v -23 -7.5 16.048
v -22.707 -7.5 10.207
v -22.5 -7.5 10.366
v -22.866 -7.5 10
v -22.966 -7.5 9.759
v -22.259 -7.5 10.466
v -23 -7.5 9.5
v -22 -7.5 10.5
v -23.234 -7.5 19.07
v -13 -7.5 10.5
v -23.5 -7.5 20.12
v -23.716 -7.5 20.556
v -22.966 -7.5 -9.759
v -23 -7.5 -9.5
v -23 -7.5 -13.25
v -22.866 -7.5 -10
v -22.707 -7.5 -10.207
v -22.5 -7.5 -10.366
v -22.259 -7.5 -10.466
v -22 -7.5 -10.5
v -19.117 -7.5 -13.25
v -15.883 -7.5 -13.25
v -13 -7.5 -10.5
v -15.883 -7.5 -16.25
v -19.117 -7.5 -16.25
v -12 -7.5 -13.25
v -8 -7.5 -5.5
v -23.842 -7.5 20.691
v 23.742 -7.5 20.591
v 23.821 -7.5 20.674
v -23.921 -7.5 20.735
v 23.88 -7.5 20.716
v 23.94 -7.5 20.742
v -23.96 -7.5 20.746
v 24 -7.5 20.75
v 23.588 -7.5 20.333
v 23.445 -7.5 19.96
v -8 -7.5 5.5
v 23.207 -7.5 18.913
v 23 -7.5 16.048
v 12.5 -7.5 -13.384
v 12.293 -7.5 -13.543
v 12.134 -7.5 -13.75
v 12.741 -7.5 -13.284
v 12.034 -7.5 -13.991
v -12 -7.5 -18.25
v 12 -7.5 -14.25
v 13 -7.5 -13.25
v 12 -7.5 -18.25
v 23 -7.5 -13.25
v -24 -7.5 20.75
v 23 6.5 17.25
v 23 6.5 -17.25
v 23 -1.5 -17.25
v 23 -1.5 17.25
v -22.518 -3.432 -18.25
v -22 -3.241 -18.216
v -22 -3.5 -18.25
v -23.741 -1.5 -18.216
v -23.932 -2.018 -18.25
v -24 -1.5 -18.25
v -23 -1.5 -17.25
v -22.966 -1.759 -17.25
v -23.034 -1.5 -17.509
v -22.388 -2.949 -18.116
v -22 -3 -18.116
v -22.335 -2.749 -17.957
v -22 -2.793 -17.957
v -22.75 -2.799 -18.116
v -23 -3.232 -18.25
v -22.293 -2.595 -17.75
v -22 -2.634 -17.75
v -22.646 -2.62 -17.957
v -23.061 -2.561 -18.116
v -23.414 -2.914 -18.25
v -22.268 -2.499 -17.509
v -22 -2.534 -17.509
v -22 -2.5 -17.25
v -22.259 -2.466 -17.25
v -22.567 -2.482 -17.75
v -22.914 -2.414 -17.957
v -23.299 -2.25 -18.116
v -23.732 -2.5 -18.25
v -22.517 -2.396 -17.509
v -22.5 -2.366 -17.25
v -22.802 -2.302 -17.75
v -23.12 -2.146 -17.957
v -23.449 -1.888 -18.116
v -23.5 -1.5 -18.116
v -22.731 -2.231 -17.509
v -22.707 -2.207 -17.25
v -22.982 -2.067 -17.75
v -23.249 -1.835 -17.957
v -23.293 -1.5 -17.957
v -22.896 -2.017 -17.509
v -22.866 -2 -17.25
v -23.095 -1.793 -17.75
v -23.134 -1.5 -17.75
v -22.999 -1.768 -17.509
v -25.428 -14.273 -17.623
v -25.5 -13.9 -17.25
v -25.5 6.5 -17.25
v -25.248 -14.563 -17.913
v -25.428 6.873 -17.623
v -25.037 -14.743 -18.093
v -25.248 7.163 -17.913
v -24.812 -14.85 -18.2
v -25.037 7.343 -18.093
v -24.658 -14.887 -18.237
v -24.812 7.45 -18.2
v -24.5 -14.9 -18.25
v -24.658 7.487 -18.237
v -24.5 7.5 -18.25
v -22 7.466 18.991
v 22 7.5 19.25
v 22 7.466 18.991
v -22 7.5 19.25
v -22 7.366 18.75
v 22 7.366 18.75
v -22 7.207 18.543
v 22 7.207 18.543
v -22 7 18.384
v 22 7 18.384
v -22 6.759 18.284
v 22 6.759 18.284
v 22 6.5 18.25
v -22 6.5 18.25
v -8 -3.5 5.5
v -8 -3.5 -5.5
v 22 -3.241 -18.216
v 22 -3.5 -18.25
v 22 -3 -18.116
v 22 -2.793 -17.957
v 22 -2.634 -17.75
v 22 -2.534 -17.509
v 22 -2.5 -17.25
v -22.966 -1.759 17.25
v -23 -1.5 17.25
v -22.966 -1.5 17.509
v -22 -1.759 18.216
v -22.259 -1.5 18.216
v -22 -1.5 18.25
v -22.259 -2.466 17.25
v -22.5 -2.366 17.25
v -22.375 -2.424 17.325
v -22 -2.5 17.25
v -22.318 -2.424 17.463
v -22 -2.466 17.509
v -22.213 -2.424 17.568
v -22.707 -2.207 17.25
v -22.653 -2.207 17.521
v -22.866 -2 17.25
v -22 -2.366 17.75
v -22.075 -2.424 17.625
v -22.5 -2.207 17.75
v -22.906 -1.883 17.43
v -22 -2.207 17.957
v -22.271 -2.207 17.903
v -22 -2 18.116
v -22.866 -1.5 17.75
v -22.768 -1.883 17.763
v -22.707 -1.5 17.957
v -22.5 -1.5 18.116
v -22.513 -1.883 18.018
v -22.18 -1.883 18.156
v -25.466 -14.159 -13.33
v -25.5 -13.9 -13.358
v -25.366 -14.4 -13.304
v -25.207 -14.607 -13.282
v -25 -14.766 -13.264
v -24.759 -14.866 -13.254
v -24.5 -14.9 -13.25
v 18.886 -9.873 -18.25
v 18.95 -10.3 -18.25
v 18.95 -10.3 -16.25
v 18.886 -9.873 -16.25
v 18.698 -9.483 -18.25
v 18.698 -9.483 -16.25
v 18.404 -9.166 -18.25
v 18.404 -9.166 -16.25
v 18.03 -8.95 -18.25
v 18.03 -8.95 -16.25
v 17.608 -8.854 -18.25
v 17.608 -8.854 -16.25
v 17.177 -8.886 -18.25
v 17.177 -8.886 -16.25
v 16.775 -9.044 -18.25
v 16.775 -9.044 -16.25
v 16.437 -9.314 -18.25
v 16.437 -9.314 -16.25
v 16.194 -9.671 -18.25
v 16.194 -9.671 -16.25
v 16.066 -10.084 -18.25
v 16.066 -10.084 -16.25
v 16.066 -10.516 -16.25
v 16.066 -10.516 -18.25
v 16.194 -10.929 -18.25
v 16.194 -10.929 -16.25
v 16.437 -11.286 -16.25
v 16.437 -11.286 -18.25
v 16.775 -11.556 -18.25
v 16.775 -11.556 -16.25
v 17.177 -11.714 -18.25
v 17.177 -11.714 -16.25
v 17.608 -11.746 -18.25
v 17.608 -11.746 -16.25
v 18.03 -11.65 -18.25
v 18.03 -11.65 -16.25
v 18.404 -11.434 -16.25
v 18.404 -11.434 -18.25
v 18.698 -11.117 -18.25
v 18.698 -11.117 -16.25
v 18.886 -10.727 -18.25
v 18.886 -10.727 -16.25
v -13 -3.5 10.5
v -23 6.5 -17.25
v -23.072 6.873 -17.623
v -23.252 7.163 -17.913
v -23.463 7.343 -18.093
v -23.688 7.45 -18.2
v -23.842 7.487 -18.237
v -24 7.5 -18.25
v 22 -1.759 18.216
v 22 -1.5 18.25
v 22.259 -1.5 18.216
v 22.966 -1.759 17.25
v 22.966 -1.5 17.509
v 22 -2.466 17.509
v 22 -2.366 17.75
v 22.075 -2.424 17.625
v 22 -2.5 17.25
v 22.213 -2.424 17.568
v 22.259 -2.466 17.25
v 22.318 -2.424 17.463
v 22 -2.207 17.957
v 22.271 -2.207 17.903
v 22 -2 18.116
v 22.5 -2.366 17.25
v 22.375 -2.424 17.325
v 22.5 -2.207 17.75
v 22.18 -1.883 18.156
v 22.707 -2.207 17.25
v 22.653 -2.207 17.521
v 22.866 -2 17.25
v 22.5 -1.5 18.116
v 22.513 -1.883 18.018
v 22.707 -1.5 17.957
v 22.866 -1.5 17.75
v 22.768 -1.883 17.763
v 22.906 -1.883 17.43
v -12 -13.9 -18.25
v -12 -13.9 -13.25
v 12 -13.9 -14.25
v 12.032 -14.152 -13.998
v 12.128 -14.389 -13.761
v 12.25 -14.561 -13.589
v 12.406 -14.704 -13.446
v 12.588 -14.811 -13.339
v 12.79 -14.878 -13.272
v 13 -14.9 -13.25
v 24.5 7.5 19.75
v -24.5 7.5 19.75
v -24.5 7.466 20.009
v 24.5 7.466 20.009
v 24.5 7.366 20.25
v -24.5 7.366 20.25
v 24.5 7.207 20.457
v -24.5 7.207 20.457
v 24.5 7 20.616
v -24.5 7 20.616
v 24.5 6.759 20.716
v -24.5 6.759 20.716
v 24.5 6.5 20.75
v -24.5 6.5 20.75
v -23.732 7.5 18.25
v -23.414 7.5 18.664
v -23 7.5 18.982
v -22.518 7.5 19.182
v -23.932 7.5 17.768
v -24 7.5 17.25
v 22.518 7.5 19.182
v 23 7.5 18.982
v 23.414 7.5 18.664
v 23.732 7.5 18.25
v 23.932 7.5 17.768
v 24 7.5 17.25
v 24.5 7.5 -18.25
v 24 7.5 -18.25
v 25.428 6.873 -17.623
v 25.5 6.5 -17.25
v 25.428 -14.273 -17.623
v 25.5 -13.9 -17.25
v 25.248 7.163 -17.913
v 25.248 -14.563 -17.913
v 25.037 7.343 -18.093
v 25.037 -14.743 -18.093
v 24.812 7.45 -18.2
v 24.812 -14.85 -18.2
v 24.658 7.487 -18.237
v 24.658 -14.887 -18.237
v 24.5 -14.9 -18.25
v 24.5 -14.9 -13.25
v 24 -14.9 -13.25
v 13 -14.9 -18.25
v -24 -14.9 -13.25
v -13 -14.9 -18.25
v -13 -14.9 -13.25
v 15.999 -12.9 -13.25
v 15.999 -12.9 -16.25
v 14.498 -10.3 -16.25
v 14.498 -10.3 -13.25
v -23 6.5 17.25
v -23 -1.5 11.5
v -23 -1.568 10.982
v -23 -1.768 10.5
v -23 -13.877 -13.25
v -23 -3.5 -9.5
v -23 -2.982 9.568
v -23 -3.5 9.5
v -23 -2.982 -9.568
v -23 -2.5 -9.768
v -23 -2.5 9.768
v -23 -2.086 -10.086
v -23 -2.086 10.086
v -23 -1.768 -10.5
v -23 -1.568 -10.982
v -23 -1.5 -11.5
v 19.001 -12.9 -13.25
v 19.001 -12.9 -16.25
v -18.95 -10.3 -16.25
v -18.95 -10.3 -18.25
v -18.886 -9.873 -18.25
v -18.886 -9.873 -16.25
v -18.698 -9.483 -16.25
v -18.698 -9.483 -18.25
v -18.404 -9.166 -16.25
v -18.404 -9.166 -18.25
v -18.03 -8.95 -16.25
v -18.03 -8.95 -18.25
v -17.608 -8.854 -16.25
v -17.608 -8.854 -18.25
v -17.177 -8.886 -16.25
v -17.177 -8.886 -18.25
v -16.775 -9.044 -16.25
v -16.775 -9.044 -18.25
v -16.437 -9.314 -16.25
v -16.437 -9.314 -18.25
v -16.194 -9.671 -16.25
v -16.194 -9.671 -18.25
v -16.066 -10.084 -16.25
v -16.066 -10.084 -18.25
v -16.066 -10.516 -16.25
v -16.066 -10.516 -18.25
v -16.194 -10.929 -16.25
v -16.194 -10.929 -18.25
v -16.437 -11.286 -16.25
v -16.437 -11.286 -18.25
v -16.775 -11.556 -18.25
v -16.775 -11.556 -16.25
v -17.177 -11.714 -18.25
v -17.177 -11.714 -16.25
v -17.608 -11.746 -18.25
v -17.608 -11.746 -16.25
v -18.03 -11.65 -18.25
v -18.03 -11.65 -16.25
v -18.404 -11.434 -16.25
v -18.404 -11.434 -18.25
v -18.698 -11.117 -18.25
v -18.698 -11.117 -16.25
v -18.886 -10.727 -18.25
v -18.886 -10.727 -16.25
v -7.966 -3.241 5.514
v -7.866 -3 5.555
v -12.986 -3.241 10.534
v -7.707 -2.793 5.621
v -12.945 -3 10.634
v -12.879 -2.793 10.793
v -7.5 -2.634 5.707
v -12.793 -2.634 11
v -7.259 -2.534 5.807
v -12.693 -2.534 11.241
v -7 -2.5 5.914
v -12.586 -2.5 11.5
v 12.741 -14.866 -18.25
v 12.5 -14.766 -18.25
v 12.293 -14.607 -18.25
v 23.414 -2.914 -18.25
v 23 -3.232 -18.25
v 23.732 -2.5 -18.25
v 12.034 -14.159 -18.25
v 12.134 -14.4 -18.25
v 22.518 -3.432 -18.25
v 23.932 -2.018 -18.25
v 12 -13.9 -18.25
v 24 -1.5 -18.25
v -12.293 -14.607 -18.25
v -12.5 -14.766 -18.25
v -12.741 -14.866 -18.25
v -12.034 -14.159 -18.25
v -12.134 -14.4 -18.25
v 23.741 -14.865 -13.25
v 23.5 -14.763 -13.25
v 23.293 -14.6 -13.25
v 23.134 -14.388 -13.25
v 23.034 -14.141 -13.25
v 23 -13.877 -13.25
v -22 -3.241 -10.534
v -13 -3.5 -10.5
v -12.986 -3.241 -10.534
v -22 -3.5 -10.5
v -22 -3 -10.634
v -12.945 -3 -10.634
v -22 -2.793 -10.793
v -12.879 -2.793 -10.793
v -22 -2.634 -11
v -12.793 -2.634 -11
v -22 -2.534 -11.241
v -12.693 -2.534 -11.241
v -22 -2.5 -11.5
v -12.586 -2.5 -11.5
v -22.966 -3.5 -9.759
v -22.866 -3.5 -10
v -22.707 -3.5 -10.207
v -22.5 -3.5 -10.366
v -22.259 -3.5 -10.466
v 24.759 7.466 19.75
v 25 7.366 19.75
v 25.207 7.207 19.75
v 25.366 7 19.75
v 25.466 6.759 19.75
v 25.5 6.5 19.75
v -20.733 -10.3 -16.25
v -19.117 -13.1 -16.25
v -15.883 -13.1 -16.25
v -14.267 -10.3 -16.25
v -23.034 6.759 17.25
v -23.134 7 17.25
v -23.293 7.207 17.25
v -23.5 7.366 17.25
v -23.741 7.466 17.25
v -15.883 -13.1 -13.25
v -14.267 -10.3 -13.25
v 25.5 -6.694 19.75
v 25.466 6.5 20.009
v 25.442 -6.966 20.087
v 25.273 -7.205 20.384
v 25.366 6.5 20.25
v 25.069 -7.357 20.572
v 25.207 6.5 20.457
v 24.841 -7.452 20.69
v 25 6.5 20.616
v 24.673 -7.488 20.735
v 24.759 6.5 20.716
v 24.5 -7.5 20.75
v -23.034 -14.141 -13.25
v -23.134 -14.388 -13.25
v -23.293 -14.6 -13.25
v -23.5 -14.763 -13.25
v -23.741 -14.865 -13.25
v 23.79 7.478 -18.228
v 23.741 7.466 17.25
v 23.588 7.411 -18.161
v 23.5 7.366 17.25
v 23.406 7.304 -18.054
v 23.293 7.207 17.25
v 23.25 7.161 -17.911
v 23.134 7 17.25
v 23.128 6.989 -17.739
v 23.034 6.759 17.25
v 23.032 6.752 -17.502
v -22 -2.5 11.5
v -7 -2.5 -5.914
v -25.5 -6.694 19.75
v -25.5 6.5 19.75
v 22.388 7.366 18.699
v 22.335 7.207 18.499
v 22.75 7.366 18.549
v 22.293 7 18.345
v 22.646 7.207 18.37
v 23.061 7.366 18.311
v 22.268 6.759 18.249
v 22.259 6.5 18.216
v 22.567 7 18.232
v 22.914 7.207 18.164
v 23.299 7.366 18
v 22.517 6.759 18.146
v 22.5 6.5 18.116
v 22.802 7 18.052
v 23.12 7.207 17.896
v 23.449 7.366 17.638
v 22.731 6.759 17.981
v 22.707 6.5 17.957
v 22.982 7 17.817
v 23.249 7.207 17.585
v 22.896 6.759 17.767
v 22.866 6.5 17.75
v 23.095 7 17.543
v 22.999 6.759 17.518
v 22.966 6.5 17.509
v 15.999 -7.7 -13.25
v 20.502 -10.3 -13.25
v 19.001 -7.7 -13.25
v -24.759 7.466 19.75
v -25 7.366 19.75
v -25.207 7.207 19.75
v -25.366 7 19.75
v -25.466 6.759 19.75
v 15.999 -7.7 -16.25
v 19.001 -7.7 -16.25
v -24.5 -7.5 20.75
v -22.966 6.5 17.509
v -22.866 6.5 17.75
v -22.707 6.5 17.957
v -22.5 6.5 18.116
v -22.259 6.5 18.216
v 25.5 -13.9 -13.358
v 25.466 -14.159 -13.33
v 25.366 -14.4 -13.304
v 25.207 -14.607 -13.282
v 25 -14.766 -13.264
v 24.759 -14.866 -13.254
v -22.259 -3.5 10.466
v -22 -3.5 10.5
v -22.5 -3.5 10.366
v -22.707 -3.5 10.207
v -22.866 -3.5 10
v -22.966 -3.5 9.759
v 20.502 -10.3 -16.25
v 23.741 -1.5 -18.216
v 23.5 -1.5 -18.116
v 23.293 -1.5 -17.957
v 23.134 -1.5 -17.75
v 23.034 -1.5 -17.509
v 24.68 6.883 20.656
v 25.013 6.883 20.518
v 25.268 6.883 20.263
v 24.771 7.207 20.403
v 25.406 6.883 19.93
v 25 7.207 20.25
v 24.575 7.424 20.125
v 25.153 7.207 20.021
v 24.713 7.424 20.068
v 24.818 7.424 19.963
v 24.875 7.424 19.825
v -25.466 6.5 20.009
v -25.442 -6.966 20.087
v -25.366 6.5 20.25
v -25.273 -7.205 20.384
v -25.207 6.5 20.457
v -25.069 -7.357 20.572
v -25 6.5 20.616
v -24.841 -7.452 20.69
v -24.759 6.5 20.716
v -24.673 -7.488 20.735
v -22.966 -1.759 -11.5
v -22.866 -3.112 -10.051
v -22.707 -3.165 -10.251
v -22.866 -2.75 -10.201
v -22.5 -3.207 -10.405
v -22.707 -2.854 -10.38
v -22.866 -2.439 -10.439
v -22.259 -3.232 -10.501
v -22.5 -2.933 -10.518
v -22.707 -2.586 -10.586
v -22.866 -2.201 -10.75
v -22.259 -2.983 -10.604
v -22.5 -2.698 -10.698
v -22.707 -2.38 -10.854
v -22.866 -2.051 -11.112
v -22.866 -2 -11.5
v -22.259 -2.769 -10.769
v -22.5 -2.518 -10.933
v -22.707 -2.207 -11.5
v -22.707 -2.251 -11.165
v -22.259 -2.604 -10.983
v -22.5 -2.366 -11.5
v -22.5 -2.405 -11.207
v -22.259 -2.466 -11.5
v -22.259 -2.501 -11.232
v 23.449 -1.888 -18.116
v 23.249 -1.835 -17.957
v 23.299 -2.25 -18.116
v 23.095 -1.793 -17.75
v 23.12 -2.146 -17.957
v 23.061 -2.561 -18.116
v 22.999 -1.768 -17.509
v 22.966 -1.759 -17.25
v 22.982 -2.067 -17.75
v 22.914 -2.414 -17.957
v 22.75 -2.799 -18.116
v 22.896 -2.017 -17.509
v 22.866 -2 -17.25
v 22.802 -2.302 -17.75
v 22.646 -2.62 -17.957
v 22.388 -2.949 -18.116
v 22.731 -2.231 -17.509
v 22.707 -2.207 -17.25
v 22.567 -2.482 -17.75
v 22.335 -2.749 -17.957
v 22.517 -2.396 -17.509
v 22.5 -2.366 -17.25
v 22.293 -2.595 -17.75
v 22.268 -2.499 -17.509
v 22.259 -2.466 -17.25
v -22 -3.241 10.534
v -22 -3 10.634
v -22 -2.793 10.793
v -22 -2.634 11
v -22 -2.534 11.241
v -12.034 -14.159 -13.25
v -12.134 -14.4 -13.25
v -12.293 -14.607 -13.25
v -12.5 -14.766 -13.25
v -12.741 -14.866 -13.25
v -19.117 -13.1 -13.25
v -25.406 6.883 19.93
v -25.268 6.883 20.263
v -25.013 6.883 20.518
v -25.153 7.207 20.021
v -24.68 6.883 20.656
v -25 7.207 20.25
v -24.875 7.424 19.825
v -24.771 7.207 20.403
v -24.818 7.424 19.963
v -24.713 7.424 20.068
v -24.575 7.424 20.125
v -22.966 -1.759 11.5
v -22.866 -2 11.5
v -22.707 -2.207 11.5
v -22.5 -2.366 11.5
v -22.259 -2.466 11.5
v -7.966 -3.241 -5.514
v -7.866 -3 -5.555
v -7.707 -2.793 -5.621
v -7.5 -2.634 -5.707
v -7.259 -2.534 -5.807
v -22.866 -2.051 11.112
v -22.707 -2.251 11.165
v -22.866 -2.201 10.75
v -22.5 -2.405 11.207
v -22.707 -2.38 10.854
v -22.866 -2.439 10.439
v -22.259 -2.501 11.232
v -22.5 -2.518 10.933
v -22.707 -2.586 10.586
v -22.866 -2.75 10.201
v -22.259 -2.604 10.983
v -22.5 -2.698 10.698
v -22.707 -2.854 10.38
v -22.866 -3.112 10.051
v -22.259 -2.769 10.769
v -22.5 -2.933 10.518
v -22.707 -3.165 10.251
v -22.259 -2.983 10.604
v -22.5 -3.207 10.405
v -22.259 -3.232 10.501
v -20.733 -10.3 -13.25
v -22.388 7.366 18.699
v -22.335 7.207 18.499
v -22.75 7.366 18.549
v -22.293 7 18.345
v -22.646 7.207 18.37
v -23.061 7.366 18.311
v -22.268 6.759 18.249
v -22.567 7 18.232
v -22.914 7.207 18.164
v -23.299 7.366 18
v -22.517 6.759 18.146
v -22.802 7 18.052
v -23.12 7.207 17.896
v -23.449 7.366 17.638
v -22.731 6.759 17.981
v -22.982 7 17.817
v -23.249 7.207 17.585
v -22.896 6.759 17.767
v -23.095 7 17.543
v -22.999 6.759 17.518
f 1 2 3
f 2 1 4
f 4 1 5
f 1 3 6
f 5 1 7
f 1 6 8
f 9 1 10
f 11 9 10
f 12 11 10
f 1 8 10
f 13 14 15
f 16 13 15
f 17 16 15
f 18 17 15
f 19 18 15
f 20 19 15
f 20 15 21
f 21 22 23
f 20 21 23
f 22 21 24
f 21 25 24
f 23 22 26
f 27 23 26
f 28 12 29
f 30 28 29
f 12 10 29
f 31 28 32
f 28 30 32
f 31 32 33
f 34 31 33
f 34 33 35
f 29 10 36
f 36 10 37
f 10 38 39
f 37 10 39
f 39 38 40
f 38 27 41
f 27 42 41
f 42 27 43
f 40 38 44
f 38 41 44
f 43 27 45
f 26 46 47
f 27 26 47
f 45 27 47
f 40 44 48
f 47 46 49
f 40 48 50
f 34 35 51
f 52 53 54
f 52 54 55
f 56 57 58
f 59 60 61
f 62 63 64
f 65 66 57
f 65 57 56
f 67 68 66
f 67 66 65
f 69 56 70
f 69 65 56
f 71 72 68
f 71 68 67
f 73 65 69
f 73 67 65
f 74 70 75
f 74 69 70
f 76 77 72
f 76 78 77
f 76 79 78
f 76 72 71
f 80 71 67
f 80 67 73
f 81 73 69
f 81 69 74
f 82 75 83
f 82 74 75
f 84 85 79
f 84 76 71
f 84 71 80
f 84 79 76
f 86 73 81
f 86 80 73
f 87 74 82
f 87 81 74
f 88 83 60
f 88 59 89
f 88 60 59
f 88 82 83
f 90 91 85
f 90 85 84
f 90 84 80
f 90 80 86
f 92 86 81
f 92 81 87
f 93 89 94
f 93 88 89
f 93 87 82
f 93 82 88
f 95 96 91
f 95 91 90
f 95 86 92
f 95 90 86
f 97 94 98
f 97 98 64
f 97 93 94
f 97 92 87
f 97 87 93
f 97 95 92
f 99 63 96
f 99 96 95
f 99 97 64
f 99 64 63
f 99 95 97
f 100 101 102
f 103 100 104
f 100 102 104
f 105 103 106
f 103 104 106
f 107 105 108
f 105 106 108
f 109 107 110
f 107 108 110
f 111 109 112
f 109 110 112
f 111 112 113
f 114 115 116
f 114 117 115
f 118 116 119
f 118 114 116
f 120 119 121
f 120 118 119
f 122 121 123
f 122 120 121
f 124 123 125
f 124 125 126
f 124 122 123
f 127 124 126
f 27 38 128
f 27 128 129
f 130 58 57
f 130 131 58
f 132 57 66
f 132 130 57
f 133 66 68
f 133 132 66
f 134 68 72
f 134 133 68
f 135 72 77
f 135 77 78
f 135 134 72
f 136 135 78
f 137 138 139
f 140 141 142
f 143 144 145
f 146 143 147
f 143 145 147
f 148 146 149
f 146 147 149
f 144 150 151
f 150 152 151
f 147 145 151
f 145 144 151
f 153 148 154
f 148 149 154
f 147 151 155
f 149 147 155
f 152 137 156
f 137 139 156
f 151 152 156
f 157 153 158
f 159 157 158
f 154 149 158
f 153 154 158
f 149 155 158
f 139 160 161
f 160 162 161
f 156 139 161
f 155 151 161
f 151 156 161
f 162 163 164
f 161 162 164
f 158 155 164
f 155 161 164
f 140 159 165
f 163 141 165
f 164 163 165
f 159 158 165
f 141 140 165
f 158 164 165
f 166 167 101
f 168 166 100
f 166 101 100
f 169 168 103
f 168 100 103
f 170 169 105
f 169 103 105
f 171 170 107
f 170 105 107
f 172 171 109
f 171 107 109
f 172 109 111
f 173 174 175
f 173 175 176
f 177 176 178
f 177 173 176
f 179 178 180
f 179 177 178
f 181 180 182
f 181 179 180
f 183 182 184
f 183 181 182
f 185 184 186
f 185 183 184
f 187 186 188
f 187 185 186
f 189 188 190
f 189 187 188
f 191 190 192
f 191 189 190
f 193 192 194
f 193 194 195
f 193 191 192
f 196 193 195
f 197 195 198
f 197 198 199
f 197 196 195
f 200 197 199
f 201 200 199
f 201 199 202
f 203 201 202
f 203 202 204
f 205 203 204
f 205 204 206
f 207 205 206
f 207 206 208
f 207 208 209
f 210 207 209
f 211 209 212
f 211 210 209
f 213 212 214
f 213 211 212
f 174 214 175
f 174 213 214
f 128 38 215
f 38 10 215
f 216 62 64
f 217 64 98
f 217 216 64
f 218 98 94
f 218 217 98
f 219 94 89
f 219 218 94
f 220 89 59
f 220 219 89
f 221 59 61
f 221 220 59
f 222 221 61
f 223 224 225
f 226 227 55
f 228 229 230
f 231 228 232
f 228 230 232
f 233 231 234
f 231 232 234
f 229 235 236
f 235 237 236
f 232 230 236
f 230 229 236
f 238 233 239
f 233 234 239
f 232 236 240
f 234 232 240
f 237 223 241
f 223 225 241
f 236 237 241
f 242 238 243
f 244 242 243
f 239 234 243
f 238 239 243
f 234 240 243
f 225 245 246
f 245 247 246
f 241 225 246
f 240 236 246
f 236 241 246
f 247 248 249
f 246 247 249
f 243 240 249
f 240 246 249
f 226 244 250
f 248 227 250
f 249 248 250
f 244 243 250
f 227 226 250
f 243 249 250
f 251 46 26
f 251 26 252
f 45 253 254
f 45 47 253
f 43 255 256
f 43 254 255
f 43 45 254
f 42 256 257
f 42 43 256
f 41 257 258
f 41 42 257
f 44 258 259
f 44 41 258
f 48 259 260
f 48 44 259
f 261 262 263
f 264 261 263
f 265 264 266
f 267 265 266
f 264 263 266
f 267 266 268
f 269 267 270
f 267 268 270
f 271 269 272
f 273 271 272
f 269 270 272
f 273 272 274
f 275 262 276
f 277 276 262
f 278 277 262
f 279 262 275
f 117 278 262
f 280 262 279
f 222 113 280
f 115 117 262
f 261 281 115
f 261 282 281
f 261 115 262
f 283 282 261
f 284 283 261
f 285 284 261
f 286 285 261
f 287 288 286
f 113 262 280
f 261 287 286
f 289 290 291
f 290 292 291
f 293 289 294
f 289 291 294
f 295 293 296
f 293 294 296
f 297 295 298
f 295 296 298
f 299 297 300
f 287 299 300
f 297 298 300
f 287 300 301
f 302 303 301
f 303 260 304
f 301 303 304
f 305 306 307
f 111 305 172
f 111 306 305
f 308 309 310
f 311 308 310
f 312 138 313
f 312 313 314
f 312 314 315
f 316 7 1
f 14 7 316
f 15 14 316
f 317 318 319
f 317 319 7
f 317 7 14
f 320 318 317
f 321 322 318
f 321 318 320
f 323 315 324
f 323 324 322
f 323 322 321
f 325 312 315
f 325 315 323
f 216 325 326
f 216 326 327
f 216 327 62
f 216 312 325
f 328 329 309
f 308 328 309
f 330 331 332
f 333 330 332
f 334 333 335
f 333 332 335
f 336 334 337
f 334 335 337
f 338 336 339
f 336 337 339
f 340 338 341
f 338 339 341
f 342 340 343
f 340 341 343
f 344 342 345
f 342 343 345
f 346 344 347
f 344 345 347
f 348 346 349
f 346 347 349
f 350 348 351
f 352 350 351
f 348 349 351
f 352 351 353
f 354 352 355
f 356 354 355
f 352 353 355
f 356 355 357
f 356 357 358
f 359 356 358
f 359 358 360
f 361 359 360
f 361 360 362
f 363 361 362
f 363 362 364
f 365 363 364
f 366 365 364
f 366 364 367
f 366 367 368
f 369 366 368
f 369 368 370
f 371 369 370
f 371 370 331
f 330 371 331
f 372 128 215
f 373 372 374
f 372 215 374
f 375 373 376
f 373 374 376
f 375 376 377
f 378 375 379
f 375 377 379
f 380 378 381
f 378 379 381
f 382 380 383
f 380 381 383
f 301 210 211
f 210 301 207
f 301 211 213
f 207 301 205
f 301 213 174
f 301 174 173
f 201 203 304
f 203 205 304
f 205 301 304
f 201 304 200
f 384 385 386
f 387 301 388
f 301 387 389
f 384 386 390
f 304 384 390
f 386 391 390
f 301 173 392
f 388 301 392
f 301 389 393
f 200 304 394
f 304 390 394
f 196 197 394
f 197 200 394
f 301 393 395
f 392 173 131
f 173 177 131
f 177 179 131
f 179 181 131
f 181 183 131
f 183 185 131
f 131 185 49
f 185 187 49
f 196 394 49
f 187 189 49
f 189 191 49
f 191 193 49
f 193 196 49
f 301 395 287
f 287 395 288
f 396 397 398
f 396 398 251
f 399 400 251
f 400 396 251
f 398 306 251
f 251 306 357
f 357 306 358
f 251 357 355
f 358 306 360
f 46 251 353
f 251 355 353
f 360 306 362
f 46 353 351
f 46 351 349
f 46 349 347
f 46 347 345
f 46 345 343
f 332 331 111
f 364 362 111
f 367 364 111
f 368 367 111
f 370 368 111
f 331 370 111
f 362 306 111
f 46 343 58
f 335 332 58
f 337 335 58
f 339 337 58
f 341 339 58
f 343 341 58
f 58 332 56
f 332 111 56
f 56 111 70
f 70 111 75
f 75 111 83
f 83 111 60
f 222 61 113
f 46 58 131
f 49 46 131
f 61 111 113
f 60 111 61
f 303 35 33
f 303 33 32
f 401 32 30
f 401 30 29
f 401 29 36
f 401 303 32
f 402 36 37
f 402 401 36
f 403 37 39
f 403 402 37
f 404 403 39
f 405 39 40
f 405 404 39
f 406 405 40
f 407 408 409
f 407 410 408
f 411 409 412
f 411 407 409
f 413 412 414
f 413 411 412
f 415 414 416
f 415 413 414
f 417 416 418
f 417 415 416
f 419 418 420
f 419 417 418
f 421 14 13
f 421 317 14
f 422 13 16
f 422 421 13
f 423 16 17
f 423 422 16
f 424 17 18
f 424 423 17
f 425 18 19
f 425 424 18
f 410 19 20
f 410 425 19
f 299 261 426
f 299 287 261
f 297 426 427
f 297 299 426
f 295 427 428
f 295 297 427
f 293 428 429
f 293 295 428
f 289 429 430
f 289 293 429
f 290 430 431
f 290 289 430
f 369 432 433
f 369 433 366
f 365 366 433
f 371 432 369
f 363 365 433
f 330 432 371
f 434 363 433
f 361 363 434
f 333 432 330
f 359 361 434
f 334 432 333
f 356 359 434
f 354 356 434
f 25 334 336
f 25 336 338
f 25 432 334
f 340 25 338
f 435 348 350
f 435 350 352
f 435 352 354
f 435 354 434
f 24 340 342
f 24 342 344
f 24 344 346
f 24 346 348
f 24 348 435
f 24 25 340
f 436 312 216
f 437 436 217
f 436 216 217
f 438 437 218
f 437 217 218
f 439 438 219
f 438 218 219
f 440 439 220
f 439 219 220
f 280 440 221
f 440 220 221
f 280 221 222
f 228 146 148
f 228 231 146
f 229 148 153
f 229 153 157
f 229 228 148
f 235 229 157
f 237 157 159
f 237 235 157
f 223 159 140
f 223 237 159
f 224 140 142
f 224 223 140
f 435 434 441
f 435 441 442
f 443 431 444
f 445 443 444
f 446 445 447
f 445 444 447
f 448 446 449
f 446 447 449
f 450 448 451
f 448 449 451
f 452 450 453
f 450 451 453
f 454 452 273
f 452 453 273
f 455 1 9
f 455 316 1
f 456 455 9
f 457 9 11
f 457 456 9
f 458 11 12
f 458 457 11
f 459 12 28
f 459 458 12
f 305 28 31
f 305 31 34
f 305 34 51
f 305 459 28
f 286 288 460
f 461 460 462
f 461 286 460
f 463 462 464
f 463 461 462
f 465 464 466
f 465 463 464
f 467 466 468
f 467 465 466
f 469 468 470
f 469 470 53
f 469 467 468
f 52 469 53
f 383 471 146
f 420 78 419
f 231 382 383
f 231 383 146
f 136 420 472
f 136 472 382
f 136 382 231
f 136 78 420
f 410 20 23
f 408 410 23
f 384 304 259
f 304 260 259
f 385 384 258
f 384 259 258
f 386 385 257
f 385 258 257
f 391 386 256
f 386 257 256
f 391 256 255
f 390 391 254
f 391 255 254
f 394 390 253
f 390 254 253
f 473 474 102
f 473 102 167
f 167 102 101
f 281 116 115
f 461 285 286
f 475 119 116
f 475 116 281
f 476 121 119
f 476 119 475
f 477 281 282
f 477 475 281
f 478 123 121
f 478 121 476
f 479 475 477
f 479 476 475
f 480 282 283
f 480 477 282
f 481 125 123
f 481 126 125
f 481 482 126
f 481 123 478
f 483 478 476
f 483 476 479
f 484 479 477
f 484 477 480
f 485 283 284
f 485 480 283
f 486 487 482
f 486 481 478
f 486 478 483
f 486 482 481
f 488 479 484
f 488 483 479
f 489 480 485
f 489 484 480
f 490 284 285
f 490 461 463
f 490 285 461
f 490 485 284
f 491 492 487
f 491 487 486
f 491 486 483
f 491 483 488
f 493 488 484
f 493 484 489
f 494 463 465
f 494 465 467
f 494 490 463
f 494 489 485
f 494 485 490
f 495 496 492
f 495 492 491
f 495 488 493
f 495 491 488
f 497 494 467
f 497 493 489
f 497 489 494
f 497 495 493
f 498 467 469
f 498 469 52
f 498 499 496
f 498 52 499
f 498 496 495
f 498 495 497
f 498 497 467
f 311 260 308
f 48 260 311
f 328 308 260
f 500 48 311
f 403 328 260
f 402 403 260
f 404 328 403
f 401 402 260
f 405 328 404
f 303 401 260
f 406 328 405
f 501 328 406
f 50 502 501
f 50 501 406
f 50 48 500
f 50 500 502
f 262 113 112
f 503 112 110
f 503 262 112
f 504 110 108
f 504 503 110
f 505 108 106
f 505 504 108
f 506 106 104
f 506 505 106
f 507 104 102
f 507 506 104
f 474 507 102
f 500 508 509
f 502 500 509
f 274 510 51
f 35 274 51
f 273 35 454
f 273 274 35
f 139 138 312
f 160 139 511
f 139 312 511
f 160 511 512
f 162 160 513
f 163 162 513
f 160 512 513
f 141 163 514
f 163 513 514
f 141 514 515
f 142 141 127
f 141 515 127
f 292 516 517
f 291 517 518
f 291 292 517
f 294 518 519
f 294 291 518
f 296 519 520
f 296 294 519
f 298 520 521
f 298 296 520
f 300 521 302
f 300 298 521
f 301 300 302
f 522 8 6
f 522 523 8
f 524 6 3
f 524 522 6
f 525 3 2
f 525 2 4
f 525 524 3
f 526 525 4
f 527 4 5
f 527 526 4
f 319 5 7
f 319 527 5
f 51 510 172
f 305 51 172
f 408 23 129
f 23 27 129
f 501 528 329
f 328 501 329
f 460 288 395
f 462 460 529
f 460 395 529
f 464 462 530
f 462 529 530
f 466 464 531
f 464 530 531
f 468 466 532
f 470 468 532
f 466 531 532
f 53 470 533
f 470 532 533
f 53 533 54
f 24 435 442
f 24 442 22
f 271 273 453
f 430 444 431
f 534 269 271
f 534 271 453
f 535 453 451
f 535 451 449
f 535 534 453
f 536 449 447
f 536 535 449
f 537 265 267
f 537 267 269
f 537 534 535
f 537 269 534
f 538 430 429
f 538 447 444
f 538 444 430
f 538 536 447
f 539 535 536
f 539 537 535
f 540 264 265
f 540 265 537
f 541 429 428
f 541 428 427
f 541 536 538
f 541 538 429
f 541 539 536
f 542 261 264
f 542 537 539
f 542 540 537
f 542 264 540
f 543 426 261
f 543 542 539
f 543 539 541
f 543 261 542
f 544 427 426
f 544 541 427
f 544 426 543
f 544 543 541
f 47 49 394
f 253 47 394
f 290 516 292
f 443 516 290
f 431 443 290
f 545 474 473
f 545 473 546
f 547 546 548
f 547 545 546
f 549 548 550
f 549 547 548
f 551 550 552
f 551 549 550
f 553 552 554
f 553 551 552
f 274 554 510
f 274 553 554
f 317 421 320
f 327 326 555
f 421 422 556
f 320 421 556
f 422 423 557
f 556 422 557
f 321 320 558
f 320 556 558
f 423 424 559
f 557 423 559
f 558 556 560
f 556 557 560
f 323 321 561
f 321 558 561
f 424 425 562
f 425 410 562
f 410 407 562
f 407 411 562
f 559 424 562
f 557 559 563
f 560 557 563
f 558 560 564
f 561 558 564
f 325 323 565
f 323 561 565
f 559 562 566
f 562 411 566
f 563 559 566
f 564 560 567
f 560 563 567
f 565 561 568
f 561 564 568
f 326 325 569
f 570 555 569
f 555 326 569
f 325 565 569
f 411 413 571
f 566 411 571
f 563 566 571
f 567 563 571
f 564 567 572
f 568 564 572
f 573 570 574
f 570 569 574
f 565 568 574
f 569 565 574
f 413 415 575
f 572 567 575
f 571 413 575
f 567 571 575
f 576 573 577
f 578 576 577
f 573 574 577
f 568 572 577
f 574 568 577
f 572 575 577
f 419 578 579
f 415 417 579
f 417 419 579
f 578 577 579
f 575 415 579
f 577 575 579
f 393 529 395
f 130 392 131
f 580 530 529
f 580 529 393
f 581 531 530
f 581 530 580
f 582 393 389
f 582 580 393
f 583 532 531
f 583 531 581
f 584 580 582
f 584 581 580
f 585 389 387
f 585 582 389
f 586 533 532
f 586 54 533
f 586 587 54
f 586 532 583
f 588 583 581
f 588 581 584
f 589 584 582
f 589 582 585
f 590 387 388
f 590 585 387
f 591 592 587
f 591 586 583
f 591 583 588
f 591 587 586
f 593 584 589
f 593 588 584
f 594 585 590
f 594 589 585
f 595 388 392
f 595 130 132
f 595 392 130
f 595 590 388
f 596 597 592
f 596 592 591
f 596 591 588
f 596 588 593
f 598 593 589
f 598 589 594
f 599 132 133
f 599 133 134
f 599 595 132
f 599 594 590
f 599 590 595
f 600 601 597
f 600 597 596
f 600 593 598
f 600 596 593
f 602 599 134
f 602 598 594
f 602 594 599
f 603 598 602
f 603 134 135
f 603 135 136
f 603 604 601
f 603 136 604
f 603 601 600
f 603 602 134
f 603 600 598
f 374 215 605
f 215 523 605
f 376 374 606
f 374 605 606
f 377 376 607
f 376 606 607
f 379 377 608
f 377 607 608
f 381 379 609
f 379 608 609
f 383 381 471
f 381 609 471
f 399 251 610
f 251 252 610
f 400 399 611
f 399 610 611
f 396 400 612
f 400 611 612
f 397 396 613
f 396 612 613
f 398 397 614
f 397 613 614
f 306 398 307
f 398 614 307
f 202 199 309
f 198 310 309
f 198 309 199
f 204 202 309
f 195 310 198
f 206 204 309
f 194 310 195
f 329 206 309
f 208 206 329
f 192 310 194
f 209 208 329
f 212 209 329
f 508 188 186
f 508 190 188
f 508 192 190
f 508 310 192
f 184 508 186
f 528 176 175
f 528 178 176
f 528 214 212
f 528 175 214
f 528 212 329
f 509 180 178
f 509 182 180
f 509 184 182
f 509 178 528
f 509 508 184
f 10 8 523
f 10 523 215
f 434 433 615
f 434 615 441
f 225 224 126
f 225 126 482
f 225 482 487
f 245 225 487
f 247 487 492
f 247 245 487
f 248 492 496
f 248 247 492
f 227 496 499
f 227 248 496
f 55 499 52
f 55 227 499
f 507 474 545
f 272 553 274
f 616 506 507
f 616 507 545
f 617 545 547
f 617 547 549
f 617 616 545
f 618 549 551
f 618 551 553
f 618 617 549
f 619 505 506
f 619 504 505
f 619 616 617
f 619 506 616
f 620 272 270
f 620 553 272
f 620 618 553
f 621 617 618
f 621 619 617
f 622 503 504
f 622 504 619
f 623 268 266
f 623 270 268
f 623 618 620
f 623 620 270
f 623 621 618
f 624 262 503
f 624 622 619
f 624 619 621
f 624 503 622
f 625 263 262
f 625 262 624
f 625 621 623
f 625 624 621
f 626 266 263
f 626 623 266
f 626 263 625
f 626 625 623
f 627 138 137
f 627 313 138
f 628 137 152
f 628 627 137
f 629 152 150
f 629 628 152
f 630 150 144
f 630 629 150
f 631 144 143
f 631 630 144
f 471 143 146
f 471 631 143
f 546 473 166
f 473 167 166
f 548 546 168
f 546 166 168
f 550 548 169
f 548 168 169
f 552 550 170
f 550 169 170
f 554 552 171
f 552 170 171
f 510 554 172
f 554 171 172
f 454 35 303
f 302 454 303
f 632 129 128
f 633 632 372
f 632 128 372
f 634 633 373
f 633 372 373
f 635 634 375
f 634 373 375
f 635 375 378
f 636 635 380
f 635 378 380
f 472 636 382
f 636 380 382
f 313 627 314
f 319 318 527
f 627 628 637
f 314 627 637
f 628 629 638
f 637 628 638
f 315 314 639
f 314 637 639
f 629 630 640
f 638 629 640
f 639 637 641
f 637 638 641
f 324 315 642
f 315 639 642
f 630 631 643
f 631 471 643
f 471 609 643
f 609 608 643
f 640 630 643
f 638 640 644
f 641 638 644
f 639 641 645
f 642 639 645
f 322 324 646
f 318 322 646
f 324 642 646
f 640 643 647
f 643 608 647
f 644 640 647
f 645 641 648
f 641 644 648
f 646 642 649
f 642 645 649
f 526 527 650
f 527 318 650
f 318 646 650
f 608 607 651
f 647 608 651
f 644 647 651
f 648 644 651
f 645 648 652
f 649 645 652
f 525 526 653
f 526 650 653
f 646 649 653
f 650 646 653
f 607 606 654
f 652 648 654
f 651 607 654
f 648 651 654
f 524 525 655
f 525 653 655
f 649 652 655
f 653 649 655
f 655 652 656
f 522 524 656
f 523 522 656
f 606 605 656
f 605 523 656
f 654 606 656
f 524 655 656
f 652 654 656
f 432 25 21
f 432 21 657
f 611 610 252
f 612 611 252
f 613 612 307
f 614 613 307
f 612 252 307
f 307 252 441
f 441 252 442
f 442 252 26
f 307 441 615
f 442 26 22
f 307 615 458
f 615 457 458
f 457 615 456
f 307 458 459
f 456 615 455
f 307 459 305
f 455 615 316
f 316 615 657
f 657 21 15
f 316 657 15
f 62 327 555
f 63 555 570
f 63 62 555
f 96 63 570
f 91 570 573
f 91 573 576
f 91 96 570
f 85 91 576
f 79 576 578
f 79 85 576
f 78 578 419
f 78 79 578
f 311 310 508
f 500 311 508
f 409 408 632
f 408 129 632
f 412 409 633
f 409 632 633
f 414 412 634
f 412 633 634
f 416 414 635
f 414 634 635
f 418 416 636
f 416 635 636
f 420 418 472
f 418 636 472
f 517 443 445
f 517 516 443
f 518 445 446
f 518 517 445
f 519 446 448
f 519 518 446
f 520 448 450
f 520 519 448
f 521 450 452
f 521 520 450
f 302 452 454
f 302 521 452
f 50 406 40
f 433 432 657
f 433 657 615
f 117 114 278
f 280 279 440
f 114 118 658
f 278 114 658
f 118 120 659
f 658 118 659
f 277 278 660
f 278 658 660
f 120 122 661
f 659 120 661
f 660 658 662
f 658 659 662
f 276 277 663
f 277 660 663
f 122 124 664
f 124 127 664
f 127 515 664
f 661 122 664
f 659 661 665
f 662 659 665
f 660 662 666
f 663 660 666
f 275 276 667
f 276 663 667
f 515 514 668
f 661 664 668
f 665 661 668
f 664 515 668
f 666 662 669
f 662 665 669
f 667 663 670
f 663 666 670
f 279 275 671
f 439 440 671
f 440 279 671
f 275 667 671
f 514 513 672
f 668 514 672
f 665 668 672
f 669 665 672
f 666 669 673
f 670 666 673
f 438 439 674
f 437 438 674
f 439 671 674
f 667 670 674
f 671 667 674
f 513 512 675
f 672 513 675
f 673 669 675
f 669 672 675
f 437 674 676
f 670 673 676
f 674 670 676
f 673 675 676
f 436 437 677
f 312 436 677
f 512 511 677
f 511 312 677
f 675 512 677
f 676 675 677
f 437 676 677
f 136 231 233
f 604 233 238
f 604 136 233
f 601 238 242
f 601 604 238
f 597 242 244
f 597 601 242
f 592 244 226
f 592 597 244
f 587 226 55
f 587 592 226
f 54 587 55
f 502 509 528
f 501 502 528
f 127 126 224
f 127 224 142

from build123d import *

# Parameters (mm, degrees)
BOSS_EXTRUDE1_DEPTH     = 7.5
BOSS_EXTRUDE2_START     = -7.5
SKETCH1_3_W             = 46
SKETCH1_3_H             = 36.5
BOSS_EXTRUDE2_DEPTH     = 5
BOSS_EXTRUDE3_DEPTH     = 2.5
BOSS_EXTRUDE4_DEPTH     = 5
CUT_EXTRUDE1_START      = -5
CUT_EXTRUDE1_DEPTH      = 3
M2_5_CLEARANCE_HOLE1_D  = 2.9
MIRROR1_START           = -16.25
MIRROR1_DEPTH           = 3
MIRROR1_START_2         = -18.25
MIRROR1_2_DEPTH         = 5
MIRROR1_3_OUTLINE_R     = 1.45
MIRROR1_3_DEPTH         = 2
MIRROR1_START_3         = 23
MIRROR1_4_DEPTH         = 2.5
CUT_EXTRUDE2_DEPTH      = 37.094632565
CUT_EXTRUDE2_DEPTH_BACK = 37.094632565
SKETCH10_W              = 15
SKETCH10_H              = 21
CHAMFER1_SIZE           = 5
FILLET1_R               = 1
FILLET2_R               = 1
FILLET6_R               = 1
FILLET7_R               = 1
FILLET8_R               = 1


with BuildPart() as part:
    # Sketch1 → Boss-Extrude1 (new, symmetric)
    with BuildSketch(Plane(origin=(0, 0, 0), x_dir=(1, 0, 0), z_dir=(0, 1, 0))):
        Polygon((23, -18.25), (-23, -18.25), (-23, 18.25), (-25.5, 18.25), (-25.5, -20.75), (25.5, -20.75), (25.5, 18.25), (23, 18.25), align=None)
    extrude(amount=BOSS_EXTRUDE1_DEPTH, both=True)

    # Sketch1<3> → Boss-Extrude2 (add)
    with BuildSketch(Plane(origin=(0, 0, 0), x_dir=(1, 0, 0), z_dir=(0, 1, 0)).offset(BOSS_EXTRUDE2_START)):
        Rectangle(SKETCH1_3_W, SKETCH1_3_H)
    extrude(amount=BOSS_EXTRUDE2_DEPTH)

    # Sketch5 → Boss-Extrude3 (add)
    with BuildSketch(Plane(origin=(-25.5, 32.25, 0), x_dir=(0, 1, 0), z_dir=(-1, 0, 0))):
        Polygon((-47.15, 18.25), (-39.75, 18.25), (-39.75, -20.75), (-47.15, 13.25), align=None)
    extrude(amount=-BOSS_EXTRUDE3_DEPTH)

    # Sketch6 → Boss-Extrude4 (add)
    with BuildSketch(Plane(origin=(0, 0, -18.25), x_dir=(-1, 0, 0), z_dir=(0, 0, -1))):
        Polygon((-12, -10.3), (-14.266838493, -10.3), (-15.883419246, -13.1), (-19.116580754, -13.1), (-20.733161507, -10.3), (-19.116580754, -7.5), (-23, -7.5), (-23, -14.9), (-12, -14.9), align=None)
        Polygon((23, -7.5), (12, -7.5), (12, -10.3), (12, -14.9), (23, -14.9), align=None)
    extrude(amount=-BOSS_EXTRUDE4_DEPTH)

    # Sketch6<3> → Cut-Extrude1 (cut)
    with BuildSketch(Plane(origin=(0, 0, -18.25), x_dir=(-1, 0, 0), z_dir=(0, 0, -1)).offset(CUT_EXTRUDE1_START)):
        Polygon((19.0011107, -7.7), (15.9988893, -7.7), (14.4977786, -10.3), (15.9988893, -12.9), (19.0011107, -12.9), (20.5022214, -10.3), align=None)
    extrude(amount=CUT_EXTRUDE1_DEPTH, mode=Mode.SUBTRACT)

    # M2.5 Clearance Hole1 (through all)
    with Locations(Plane.XY.offset(-16.25)):
        with Locations((-17.5, -10.3), (17.5, -10.3)):
            Hole(M2_5_CLEARANCE_HOLE1_D / 2)

    # Mirror1: read off the stored shape, not the designer's step
    # Mirror1 outline → Mirror1 (cut)
    with BuildSketch(Plane.XY.offset(MIRROR1_START)):
        Polygon((-14.266838493, -10.3), (-15.883419246, -7.5), (-19.116580754, -7.5), (-20.733161507, -10.3), (-19.116580754, -13.1), (-15.883419246, -13.1), align=None)
        Polygon((-15.9988893, -12.9), (-19.0011107, -12.9), (-20.5022214, -10.3), (-19.0011107, -7.7), (-15.9988893, -7.7), (-14.4977786, -10.3), align=None, mode=Mode.SUBTRACT)
    extrude(amount=MIRROR1_DEPTH, mode=Mode.SUBTRACT)

    # Mirror1 2 outline → Mirror1 2 (add)
    with BuildSketch(Plane.XY.offset(MIRROR1_START_2)):
        Polygon((20.733161507, -10.3), (19.116580754, -7.5), (12, -7.5), (12, -10.3), (14.266838493, -10.3), (15.883419246, -13.1), (19.116580754, -13.1), align=None)
        Polygon((15.9988893, -7.7), (19.0011107, -7.7), (20.5022214, -10.3), (19.0011107, -12.9), (15.9988893, -12.9), (14.4977786, -10.3), align=None, mode=Mode.SUBTRACT)
    extrude(amount=MIRROR1_2_DEPTH)

    # Mirror1 3 outline → Mirror1 3 (add)
    with BuildSketch(Plane.XY.offset(MIRROR1_START_2)):
        Polygon((20.5022214, -10.3), (19.0011107, -7.7), (15.9988893, -7.7), (14.4977786, -10.3), (15.9988893, -12.9), (19.0011107, -12.9), align=None)
        with Locations((17.5, -10.3)):
            Circle(MIRROR1_3_OUTLINE_R, mode=Mode.SUBTRACT)
    extrude(amount=MIRROR1_3_DEPTH)

    # Mirror1 4 outline → Mirror1 4 (add)
    with BuildSketch(Plane.YZ.offset(MIRROR1_START_3)):
        Polygon((-14.9, -13.25), (-14.9, -18.25), (-7.5, -18.25), (-7.5, 20.75), align=None)
    extrude(amount=MIRROR1_4_DEPTH)

    # Sketch10 → Cut-Extrude2 (cut, two sides: drawn at the far end of the back side and taken through both)
    with BuildSketch(Plane(origin=(0, 0, 0), x_dir=(1, 0, 0), z_dir=(0, 1, 0)).offset(-CUT_EXTRUDE2_DEPTH_BACK)):
        with Locations((-15.5, 0)):
            Rectangle(SKETCH10_W, SKETCH10_H)
    extrude(amount=CUT_EXTRUDE2_DEPTH + CUT_EXTRUDE2_DEPTH_BACK, mode=Mode.SUBTRACT)

    # Chamfer1
    chamfer1_edges = [part.edges().sort_by_distance(p)[0] for p in [
        (-8, -5, -10.5),
        (-8, -5, 10.5),
    ]]
    chamfer(chamfer1_edges, length=CHAMFER1_SIZE)

    # Fillet1
    fillet1_edges = [part.edges().sort_by_distance(p)[0] for p in [
        (23, 7.5, 0),
        (-23, 2.5, -18.25),
        (-23, 2.5, 18.25),
        (23, 2.5, 18.25),
        (23, 2.5, -18.25),
        (0, 7.5, 18.25),
        (-23, 7.5, 0),
        (-23, -2.5, -14.375),
        (-18, -2.5, -10.5),
        (-23, -5, -10.5),
        (-23, -5, 10.5),
        (-8, -2.5, 0),
        (-18, -2.5, 10.5),
        (-23, -2.5, 14.375),
        (-10.5, -2.5, 8),
        (-10.5, -2.5, -8),
        (0, -2.5, -18.25),
        (0, -2.5, 18.25),
        (23, -2.5, 0),
    ]]
    fillet(fillet1_edges, radius=FILLET1_R)

    # Fillet2
    fillet2_edges = [part.edges().sort_by_distance(p)[0] for p in [
        (25.5, -14.9, -15.75),
        (25.5, -11.2, 3.75),
        (25.5, 0, 20.75),
        (-25.5, 0, 20.75),
        (-25.5, -3.7, -18.25),
        (25.5, -3.7, -18.25),
        (-25.5, 7.5, 1.25),
        (-25.5, -14.9, -15.75),
        (-25.5, -11.2, 3.75),
        (25.5, 7.5, 1.25),
    ]]
    fillet(fillet2_edges, radius=FILLET2_R)

    # Fillet6
    fillet6_edges = [part.edges().sort_by_distance(p)[0] for p in [
        (-12, -14.9, -15.75),
        (12, -14.9, -15.75),
        (12, -11.2, -13.25),
    ]]
    fillet(fillet6_edges, radius=FILLET6_R)

    # Fillet7
    # the kernel refuses this fillet: 1 mm, written as the material it takes off along each edge
    with BuildSketch(Plane(origin=(24.5, 6.5, 19.75), x_dir=(0, 0, 1), z_dir=(0, 1, 0))) as fillet7_piece_1_section:
        Polygon((0, 0), (FILLET7_R, 0), (FILLET7_R, FILLET7_R), (0, FILLET7_R), align=None)
    fillet7_piece_1 = extrude(amount=FILLET7_R, mode=Mode.PRIVATE)
    fillet7_piece_1 = fillet7_piece_1 - Plane(origin=(24.5, 6.5, 19.75), x_dir=(-0.7071067811865476, 0, -0.7071067811865475), z_dir=(0, 1, 0)) * Sphere(FILLET7_R, mode=Mode.PRIVATE)
    add(fillet7_piece_1, mode=Mode.SUBTRACT)
    with BuildSketch(Plane(origin=(-24.5, 6.5, 19.75), x_dir=(0, 0, 1), z_dir=(0, 1, 0))) as fillet7_piece_2_section:
        Polygon((0, 0), (FILLET7_R, 0), (FILLET7_R, -FILLET7_R), (0, -FILLET7_R), align=None)
    fillet7_piece_2 = extrude(amount=FILLET7_R, mode=Mode.PRIVATE)
    fillet7_piece_2 = fillet7_piece_2 - Plane(origin=(-24.5, 6.5, 19.75), x_dir=(0.7071067811865475, 0, -0.7071067811865475), z_dir=(0, 1, 0)) * Sphere(FILLET7_R, mode=Mode.PRIVATE)
    add(fillet7_piece_2, mode=Mode.SUBTRACT)
    with BuildSketch(Plane(origin=(-24.5, 7.5, 20.75), x_dir=(0, 0, -1), z_dir=(1, 0, 0))) as fillet7_piece_3:
        with BuildLine():
            CenterArc((FILLET7_R, -FILLET7_R), FILLET7_R, 90, 90)
            Line((0, -FILLET7_R), (0, 0))
            Line((0, 0), (FILLET7_R, 0))
        make_face()
    extrude(amount=49, mode=Mode.SUBTRACT)

    # Fillet8
    fillet8_edges = [part.edges().sort_by_distance(p)[0] for p in [
        (23, -11.2, 3.75),
        (-23, -11.2, 3.75),
    ]]
    fillet(fillet8_edges, radius=FILLET8_R)


solid = part.part
